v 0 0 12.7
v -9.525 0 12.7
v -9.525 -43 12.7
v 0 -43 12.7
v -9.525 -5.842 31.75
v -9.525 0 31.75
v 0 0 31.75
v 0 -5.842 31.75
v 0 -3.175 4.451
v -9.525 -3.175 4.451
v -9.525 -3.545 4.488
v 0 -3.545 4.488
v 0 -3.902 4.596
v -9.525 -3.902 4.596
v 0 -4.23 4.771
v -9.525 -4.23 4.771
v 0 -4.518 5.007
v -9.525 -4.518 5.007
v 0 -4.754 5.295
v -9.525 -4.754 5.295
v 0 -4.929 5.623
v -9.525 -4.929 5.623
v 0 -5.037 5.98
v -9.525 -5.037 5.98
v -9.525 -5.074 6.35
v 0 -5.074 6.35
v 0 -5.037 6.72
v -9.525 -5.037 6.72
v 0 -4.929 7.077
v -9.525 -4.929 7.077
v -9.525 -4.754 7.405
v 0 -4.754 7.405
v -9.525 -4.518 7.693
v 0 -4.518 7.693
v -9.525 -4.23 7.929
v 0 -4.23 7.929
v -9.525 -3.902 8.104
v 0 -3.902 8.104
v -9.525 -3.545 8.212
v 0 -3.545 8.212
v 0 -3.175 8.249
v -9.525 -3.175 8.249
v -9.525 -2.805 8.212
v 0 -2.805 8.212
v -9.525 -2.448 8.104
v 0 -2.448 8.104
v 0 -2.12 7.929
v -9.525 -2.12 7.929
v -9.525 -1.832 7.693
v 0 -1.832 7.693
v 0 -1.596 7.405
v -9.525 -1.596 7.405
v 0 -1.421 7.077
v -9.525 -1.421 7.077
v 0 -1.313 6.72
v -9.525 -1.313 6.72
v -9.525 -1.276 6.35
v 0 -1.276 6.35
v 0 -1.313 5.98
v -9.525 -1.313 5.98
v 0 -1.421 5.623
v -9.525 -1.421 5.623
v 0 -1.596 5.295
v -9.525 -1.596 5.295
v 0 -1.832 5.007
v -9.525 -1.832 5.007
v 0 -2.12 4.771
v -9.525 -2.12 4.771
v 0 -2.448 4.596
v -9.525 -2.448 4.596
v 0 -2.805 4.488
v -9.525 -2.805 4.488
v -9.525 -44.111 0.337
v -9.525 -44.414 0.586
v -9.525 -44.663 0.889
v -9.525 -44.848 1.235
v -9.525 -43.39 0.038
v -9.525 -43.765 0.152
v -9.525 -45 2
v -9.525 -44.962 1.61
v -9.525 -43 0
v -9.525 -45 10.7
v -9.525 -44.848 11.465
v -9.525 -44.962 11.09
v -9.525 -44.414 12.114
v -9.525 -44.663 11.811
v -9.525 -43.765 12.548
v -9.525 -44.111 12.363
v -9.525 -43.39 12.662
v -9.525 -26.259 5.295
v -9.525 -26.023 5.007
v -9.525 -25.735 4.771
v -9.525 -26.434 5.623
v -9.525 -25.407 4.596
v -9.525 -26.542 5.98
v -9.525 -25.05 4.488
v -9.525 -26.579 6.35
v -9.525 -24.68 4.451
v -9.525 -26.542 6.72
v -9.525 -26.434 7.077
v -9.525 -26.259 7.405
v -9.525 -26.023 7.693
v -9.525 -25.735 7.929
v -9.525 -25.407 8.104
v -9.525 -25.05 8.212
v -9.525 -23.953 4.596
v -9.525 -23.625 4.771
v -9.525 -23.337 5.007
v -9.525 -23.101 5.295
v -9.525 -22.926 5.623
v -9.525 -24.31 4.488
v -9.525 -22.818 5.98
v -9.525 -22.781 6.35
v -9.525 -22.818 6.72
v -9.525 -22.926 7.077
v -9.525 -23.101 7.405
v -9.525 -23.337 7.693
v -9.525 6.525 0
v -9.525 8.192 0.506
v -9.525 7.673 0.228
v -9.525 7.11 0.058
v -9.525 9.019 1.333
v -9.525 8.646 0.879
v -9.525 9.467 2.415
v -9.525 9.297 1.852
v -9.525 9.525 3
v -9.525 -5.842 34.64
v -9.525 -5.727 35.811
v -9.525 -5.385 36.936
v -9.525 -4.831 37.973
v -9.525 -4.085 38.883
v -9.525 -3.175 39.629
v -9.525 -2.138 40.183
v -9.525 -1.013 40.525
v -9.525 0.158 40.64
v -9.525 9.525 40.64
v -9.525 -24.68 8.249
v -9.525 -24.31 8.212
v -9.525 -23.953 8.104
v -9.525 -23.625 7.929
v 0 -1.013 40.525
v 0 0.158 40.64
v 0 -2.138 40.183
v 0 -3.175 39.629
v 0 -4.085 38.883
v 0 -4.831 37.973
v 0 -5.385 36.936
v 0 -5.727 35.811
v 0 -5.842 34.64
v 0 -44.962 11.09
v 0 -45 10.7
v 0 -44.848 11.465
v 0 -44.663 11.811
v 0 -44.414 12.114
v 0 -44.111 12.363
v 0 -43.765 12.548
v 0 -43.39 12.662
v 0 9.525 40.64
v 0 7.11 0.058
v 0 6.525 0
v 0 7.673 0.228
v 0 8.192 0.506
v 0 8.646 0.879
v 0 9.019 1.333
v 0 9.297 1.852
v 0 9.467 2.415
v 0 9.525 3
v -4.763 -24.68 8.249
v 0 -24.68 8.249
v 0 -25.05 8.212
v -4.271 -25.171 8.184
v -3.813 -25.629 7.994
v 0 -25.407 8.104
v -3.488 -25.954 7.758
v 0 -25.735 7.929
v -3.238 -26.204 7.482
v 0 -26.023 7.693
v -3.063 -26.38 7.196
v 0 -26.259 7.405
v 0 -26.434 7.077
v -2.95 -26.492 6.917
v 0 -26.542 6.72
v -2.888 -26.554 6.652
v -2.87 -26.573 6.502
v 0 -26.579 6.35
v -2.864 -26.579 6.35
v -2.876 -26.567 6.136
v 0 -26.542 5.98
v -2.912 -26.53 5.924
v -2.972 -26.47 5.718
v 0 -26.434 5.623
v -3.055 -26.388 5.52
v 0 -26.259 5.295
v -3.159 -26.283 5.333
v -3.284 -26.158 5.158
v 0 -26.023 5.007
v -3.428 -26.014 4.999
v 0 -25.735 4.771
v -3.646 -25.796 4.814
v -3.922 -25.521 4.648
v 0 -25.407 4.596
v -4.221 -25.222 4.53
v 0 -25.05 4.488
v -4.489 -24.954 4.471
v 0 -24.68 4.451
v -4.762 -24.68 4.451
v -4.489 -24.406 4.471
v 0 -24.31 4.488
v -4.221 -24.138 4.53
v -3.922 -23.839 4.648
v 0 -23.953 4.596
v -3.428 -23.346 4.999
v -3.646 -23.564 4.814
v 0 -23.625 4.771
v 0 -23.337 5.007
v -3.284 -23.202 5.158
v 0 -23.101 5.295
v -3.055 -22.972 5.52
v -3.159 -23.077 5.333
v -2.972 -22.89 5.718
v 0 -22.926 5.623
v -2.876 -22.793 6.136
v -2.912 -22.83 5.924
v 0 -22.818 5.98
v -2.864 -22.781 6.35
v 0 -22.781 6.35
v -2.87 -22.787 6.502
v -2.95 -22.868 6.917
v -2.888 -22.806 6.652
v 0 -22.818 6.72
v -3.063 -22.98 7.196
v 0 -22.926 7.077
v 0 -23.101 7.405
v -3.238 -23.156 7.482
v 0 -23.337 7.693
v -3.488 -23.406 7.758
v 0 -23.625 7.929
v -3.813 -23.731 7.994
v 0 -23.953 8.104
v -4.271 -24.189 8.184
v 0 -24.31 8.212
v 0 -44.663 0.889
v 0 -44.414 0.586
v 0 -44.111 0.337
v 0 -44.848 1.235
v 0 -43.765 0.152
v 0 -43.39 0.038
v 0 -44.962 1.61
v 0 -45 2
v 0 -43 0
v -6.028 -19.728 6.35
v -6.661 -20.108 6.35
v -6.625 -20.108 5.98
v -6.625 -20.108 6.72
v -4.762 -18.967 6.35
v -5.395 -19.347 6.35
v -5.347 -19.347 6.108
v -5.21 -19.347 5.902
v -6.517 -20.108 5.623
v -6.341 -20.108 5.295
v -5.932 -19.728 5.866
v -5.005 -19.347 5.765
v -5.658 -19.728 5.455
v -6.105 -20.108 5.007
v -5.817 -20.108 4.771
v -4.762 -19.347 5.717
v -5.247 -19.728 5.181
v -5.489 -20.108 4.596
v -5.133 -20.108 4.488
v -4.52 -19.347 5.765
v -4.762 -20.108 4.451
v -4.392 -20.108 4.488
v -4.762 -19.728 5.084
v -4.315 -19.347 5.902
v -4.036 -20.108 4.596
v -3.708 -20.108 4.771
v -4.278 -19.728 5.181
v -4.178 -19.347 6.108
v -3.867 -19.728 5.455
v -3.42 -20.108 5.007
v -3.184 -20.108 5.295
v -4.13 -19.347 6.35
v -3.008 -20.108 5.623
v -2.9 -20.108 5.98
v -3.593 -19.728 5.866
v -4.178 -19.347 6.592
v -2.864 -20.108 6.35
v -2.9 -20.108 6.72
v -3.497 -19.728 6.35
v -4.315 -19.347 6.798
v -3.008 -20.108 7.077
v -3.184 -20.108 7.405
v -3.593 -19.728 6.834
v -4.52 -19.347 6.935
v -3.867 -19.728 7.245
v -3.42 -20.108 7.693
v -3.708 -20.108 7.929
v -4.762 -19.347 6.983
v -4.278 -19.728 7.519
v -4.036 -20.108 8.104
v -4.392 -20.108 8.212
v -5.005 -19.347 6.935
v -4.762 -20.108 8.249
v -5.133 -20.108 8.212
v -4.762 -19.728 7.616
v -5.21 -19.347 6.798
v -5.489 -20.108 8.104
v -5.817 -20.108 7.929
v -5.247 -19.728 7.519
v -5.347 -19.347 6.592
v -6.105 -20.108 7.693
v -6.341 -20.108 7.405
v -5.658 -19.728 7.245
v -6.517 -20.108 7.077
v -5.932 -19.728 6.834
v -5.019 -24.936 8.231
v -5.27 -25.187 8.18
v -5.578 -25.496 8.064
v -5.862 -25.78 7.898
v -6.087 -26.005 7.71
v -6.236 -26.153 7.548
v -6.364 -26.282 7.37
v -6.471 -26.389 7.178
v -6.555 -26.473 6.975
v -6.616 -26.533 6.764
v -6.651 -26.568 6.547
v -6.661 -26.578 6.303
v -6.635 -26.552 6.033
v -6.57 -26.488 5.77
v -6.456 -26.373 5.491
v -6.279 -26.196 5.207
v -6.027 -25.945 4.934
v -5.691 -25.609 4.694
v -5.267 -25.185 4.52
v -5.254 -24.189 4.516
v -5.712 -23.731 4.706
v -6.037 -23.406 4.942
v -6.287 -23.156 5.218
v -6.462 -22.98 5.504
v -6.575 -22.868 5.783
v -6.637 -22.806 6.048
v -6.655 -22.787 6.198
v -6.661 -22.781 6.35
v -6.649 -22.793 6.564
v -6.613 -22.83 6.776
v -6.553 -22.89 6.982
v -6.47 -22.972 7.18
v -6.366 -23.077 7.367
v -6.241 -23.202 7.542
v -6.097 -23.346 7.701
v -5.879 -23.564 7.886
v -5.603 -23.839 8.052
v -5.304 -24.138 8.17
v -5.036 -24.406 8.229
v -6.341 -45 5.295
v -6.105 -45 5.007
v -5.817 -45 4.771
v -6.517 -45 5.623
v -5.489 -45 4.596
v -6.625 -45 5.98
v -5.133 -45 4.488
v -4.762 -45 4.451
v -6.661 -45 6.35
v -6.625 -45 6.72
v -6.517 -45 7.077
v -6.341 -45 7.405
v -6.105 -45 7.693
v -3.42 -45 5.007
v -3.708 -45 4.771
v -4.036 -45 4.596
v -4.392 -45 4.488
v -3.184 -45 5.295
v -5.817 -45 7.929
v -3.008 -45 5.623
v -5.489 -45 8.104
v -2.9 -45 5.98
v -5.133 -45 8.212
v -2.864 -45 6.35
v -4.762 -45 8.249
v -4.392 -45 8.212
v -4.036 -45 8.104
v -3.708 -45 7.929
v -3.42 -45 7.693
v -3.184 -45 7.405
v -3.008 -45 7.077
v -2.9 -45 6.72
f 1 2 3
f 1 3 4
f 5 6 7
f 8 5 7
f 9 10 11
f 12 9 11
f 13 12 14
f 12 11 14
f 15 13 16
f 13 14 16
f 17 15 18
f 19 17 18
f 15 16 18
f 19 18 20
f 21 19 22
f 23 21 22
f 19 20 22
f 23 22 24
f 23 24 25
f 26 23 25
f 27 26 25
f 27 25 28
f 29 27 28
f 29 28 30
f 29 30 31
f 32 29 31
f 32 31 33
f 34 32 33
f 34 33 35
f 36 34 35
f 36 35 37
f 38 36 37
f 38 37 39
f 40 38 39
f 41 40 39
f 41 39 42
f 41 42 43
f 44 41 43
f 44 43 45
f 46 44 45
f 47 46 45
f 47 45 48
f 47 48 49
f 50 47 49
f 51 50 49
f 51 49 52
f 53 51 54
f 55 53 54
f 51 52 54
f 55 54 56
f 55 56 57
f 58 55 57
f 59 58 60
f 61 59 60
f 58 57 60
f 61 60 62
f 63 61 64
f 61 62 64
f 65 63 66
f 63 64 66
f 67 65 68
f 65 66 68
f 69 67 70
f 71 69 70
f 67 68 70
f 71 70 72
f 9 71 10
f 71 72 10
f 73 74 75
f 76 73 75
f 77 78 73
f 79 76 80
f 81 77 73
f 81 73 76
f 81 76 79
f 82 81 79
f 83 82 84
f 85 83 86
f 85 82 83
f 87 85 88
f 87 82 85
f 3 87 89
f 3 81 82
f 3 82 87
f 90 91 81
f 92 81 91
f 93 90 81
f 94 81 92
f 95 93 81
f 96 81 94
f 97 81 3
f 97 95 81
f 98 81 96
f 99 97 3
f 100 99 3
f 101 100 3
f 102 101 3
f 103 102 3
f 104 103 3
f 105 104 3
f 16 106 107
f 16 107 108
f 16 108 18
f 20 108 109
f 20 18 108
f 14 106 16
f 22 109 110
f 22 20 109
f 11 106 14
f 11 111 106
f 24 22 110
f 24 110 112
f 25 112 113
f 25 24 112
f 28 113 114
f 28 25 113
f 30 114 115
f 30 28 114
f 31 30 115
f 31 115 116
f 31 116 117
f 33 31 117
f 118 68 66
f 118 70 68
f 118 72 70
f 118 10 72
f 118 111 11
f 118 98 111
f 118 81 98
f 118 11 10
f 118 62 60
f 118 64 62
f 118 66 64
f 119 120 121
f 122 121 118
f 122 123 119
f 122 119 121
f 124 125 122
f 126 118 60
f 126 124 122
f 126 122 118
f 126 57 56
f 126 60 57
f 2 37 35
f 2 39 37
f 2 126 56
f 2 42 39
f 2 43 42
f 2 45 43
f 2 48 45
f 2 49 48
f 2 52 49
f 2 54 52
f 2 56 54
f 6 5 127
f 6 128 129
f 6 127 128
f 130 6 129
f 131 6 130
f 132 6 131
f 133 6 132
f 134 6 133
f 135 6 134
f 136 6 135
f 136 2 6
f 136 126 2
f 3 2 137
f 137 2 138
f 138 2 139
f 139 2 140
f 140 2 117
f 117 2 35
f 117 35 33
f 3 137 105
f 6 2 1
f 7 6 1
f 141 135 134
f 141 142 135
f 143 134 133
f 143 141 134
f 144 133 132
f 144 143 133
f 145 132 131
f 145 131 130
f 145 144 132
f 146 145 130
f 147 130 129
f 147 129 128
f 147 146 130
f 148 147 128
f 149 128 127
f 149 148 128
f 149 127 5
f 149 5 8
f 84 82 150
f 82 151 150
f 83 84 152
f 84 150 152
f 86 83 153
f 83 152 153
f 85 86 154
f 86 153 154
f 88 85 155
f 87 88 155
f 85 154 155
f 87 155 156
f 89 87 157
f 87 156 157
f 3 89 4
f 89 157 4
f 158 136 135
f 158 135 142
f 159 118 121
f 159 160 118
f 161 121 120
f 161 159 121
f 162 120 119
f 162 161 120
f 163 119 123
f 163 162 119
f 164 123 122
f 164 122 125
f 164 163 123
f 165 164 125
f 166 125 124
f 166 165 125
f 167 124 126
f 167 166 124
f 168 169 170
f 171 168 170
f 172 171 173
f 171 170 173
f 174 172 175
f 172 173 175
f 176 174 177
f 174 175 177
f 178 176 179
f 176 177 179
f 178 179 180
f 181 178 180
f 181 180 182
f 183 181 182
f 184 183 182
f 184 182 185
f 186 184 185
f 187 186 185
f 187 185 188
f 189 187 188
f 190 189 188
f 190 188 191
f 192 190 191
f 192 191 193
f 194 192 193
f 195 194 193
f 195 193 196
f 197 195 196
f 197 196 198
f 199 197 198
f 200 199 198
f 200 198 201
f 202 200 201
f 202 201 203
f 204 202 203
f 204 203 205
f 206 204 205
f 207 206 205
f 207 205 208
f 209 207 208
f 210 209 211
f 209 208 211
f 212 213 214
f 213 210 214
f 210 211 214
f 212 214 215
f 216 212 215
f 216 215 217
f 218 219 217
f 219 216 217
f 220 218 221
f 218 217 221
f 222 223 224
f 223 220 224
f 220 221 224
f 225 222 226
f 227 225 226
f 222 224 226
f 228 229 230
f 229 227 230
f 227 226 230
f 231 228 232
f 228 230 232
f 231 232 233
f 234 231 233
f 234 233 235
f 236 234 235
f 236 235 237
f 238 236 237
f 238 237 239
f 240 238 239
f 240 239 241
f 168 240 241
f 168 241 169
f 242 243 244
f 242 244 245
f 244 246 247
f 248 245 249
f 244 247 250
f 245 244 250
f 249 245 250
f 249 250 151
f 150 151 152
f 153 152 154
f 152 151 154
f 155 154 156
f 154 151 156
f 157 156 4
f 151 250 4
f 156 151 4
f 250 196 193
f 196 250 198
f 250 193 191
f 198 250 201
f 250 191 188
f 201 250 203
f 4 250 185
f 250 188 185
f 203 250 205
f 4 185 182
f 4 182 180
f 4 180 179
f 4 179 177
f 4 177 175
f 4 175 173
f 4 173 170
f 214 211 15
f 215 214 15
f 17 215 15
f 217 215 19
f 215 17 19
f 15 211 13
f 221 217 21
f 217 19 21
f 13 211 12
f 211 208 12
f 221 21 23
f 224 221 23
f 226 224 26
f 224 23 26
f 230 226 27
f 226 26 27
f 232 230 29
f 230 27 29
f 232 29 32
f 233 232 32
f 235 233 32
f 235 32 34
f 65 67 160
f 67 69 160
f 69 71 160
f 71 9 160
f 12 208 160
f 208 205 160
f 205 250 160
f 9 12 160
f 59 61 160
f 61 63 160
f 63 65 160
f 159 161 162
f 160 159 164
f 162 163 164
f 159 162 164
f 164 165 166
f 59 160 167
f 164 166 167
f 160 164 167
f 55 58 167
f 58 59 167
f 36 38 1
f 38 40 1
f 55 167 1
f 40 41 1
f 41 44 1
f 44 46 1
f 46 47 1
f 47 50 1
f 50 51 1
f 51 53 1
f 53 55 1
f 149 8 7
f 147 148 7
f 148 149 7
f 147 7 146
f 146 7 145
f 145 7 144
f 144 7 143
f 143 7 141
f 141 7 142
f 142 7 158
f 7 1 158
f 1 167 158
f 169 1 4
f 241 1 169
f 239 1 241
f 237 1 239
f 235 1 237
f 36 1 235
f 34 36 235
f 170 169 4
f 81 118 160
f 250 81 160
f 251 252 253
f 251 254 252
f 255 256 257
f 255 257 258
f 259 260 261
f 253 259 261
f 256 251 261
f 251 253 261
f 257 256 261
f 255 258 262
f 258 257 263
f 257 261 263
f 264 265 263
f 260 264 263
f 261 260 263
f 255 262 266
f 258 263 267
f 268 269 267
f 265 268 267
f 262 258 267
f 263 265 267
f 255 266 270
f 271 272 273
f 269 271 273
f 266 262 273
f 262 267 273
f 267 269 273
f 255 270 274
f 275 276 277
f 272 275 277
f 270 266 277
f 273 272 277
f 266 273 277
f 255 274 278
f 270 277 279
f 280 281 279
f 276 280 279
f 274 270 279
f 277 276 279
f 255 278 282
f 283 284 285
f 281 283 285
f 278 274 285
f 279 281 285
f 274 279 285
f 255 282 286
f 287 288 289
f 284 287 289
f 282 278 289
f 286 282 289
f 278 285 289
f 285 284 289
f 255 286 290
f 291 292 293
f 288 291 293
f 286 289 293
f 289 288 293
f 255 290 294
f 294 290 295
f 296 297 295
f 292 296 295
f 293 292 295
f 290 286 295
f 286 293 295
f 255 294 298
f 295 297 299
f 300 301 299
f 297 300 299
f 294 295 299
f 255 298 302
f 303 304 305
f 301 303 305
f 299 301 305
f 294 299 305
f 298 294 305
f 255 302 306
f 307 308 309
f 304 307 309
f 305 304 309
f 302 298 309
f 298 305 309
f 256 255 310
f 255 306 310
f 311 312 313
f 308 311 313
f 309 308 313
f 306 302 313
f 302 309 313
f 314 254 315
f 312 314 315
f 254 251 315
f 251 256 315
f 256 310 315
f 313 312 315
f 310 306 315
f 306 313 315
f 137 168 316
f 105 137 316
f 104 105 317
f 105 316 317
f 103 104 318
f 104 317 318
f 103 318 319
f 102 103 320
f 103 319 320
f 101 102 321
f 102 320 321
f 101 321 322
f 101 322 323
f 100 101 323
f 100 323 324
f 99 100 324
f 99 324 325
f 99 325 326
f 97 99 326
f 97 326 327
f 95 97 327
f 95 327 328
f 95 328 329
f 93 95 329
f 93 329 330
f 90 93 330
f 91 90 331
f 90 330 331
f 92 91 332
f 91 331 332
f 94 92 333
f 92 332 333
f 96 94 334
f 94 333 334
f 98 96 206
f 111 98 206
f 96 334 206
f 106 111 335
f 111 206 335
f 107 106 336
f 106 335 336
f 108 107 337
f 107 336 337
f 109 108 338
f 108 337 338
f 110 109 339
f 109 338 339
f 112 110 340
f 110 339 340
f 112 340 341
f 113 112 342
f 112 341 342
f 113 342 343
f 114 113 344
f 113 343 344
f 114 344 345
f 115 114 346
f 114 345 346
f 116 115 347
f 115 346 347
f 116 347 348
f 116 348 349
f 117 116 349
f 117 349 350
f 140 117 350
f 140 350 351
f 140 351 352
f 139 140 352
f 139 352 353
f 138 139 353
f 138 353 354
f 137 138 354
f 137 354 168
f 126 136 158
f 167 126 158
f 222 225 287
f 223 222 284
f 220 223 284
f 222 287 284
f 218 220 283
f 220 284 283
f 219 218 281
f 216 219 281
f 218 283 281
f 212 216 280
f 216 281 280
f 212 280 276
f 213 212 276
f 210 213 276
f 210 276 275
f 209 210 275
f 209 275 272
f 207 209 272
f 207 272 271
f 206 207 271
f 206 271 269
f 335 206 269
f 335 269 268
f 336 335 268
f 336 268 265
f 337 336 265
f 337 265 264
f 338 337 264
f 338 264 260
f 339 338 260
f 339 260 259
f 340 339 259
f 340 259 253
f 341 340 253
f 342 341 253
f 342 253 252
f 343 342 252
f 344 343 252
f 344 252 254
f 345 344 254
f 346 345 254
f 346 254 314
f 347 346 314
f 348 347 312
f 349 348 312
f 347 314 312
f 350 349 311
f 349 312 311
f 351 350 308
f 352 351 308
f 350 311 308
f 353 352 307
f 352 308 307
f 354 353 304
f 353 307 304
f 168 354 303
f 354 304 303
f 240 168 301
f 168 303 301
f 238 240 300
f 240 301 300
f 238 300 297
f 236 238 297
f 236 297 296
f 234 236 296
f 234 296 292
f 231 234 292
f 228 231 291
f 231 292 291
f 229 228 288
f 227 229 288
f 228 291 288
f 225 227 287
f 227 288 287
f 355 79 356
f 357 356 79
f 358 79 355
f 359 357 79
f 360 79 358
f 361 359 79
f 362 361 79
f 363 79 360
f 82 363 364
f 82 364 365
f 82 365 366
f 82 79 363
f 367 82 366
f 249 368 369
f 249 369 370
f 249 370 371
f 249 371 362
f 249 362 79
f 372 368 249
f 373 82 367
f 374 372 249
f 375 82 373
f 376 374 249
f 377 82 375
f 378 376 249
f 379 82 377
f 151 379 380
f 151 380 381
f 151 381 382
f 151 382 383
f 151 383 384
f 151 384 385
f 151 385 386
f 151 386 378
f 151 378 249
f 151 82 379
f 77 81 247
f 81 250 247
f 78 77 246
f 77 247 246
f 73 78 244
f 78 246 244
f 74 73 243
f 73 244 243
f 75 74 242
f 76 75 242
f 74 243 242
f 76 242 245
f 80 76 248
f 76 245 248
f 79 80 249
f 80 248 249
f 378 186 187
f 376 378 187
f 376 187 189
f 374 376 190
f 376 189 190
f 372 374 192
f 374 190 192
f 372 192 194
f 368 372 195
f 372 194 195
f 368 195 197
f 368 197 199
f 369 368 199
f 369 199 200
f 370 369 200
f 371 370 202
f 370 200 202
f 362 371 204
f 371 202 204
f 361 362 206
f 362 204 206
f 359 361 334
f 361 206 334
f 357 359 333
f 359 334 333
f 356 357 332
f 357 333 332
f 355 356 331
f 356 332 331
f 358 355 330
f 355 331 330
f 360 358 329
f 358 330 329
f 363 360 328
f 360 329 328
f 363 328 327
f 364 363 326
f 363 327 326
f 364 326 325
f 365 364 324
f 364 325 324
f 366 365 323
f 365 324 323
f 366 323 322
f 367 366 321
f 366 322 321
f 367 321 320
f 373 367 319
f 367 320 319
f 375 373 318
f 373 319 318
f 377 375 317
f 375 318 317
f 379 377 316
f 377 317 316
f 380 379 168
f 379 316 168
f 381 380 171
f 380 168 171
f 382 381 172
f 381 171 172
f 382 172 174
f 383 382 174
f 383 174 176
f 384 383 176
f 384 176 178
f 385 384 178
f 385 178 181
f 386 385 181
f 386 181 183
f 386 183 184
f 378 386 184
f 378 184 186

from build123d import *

# Parameters (mm, degrees)
SKETCH1_W                 = 9.525
SKETCH1_H                 = 9.525
EXTRUDE1_DEPTH            = 40.64
SKETCH3_W                 = 9.525
SKETCH3_H                 = 8.89
EXTRUDE2_DEPTH            = 5.842
FILLET1_R                 = 6
SKETCH4_W                 = 9.525
SKETCH4_H                 = 12.7
EXTRUDE3_DEPTH            = 45
FILLET2_R                 = 3
F_6_CLEARANCE_HOLE1_D     = 3.7973
F_6_CLEARANCE_HOLE1_DEPTH = 9.906
F_6_CLEARANCE_HOLE1_TIP   = 1.140824014
F_6_CLEARANCE_HOLE3_D     = 3.7973
F_6_CLEARANCE_HOLE3_DEPTH = 24.892
F_6_CLEARANCE_HOLE3_TIP   = 1.140824014
F_6_CLEARANCE_HOLE4_D     = 3.7973
F_6_CLEARANCE_HOLE4_DEPTH = 29.972
F_6_CLEARANCE_HOLE4_TIP   = 1.140824014
FILLET3_R                 = 2


with BuildPart() as part:
    # Sketch1 → Extrude1 (new body)
    with BuildSketch(Plane.XY):
        with Locations((-4.7625, 4.7625)):
            Rectangle(SKETCH1_W, SKETCH1_H)
    extrude(amount=EXTRUDE1_DEPTH)

    # Sketch3 → Extrude2 (add)
    with BuildSketch(Plane.XZ):
        with Locations((-4.7625, 36.195)):
            Rectangle(SKETCH3_W, SKETCH3_H)
    extrude(amount=EXTRUDE2_DEPTH)

    # Fillet1
    fillet1_edges = [part.edges().sort_by_distance(p)[0] for p in [
        (-4.7625, -5.842, 40.64),
    ]]
    fillet(fillet1_edges, radius=FILLET1_R)

    # Sketch4 → Extrude3 (add)
    with BuildSketch(Plane.XZ):
        with Locations((-4.7625, 6.35)):
            Rectangle(SKETCH4_W, SKETCH4_H)
    extrude(amount=EXTRUDE3_DEPTH)

    # Fillet2
    fillet2_edges = [part.edges().sort_by_distance(p)[0] for p in [
        (-4.7625, 9.525, 0),
    ]]
    fillet(fillet2_edges, radius=FILLET2_R)

    # #6 Clearance Hole1
    with Locations(Plane(origin=(0, -3.175, 6.35), x_dir=(0, 0, 1), z_dir=(1, 0, 0))):
        with Locations((0, 0)):
            Hole(F_6_CLEARANCE_HOLE1_D / 2, depth=F_6_CLEARANCE_HOLE1_DEPTH)
            with Locations((0, 0, -(F_6_CLEARANCE_HOLE1_DEPTH + F_6_CLEARANCE_HOLE1_TIP / 2))):  # 118° drill point
                Cone(0, F_6_CLEARANCE_HOLE1_D / 2, F_6_CLEARANCE_HOLE1_TIP, mode=Mode.SUBTRACT)

    # #6 Clearance Hole3
    with Locations(Plane(origin=(-4.7625, -45, 6.35), x_dir=(-1, 0, 0), z_dir=(0, -1, 0))):
        with Locations((0, 0)):
            Hole(F_6_CLEARANCE_HOLE3_D / 2, depth=F_6_CLEARANCE_HOLE3_DEPTH)
            with Locations((0, 0, -(F_6_CLEARANCE_HOLE3_DEPTH + F_6_CLEARANCE_HOLE3_TIP / 2))):  # 118° drill point
                Cone(0, F_6_CLEARANCE_HOLE3_D / 2, F_6_CLEARANCE_HOLE3_TIP, mode=Mode.SUBTRACT)

    # #6 Clearance Hole4
    with Locations(Plane(origin=(-9.525, -24.68, 6.35), x_dir=(0, 0, -1), z_dir=(-1, 0, 0))):
        with Locations((0, 0)):
            Hole(F_6_CLEARANCE_HOLE4_D / 2, depth=F_6_CLEARANCE_HOLE4_DEPTH)
            with Locations((0, 0, -(F_6_CLEARANCE_HOLE4_DEPTH + F_6_CLEARANCE_HOLE4_TIP / 2))):  # 118° drill point
                Cone(0, F_6_CLEARANCE_HOLE4_D / 2, F_6_CLEARANCE_HOLE4_TIP, mode=Mode.SUBTRACT)

    # Fillet3
    fillet3_edges = [part.edges().sort_by_distance(p)[0] for p in [
        (-4.7625, -45, 12.7),
        (-4.7625, -45, 0),
    ]]
    fillet(fillet3_edges, radius=FILLET3_R)


solid = part.part
